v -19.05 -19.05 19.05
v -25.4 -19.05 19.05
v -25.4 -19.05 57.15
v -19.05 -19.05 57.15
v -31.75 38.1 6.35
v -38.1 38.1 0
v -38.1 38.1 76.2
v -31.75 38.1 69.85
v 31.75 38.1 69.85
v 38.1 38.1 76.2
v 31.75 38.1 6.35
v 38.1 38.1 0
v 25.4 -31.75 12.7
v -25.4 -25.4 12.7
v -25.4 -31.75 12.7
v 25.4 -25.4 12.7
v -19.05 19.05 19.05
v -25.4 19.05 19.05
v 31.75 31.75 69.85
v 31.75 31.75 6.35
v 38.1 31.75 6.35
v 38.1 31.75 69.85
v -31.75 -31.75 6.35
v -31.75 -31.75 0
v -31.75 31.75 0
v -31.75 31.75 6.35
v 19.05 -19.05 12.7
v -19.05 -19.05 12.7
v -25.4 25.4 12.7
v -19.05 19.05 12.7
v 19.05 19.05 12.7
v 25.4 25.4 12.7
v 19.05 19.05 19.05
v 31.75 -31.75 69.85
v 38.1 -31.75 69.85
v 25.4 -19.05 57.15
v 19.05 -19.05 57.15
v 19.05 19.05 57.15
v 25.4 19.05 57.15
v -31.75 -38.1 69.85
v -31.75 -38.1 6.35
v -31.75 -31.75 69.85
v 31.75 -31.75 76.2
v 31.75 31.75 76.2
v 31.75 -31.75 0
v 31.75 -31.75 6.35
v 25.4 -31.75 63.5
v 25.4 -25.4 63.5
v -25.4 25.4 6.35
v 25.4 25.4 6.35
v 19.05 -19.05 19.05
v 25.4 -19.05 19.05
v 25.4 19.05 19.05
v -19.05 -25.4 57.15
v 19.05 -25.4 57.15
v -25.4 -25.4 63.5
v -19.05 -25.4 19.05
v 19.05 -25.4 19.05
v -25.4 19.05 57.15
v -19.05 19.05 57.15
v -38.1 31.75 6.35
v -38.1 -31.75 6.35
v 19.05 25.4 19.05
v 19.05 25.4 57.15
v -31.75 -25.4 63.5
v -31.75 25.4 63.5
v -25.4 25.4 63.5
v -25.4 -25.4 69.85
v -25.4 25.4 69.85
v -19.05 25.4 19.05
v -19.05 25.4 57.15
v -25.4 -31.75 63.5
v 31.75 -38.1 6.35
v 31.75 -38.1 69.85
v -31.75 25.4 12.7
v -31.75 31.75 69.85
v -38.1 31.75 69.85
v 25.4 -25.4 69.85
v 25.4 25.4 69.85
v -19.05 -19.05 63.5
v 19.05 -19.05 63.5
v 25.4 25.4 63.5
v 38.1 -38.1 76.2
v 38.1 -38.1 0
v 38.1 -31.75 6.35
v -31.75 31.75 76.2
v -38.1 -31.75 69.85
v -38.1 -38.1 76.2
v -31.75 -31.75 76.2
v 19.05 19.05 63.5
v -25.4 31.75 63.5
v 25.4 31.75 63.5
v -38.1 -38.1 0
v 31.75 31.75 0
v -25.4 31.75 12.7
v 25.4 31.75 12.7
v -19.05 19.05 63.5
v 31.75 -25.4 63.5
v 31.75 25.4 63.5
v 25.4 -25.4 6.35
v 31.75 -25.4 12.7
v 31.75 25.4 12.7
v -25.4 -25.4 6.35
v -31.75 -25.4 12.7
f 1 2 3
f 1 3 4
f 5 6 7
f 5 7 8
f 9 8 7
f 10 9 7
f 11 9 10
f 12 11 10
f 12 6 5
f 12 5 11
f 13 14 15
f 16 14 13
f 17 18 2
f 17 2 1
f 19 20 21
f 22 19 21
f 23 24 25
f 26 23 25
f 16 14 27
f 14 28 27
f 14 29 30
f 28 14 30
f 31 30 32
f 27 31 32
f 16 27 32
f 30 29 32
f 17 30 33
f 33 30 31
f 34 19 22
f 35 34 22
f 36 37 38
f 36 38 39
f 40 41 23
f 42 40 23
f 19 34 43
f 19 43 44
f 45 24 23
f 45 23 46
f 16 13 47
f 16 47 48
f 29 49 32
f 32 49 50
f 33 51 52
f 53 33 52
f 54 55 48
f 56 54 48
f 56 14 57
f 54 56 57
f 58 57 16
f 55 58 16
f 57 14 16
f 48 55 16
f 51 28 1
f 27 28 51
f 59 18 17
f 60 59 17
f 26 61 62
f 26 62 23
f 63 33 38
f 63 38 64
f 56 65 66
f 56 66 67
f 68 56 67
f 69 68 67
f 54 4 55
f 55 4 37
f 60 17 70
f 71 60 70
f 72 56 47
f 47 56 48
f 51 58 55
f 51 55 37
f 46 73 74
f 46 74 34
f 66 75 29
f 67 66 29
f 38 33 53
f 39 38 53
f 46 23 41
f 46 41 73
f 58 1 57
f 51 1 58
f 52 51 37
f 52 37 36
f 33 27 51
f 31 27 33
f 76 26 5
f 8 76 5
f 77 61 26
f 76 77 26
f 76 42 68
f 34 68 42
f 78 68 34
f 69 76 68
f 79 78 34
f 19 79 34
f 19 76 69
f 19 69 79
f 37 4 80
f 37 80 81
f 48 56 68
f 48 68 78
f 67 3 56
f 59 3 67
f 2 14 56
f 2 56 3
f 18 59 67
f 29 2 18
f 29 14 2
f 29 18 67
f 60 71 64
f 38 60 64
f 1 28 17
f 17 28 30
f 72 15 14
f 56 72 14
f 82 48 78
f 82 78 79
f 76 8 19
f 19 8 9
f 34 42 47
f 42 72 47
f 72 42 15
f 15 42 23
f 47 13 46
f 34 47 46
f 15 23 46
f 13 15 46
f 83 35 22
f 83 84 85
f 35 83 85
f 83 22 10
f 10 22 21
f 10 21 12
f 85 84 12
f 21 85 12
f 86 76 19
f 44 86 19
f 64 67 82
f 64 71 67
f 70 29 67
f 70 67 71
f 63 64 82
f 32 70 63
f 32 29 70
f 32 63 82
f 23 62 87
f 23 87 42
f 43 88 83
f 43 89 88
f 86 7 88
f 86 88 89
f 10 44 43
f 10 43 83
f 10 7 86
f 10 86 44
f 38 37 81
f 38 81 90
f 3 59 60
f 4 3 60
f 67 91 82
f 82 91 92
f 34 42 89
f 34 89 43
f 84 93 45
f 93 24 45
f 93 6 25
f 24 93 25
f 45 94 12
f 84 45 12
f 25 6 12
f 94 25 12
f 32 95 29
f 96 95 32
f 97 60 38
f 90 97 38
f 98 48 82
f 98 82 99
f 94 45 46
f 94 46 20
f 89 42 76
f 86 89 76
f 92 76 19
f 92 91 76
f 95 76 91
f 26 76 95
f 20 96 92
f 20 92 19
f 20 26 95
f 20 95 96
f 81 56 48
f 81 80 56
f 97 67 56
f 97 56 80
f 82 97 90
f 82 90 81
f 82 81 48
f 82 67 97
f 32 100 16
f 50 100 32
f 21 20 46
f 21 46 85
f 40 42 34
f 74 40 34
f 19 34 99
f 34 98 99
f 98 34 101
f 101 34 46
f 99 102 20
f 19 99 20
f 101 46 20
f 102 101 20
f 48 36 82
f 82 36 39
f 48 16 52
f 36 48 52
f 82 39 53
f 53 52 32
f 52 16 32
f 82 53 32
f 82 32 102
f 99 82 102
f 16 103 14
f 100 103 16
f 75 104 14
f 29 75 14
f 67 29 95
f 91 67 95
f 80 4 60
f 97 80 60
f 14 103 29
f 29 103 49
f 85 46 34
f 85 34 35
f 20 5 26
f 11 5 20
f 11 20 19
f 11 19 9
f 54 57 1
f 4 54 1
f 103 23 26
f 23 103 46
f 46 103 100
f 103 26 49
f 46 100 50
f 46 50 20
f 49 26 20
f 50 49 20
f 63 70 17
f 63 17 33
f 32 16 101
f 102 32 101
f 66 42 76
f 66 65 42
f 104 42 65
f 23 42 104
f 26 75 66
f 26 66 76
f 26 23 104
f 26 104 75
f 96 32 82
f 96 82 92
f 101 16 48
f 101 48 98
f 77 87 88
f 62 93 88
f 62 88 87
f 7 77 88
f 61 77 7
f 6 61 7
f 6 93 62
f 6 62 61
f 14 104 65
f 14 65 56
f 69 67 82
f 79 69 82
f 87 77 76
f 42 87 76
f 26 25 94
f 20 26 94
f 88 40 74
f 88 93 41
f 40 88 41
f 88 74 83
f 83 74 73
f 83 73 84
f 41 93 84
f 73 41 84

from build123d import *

# Parameters (mm, degrees)
F0_W      = 76.2
F0_H      = 76.2
F0_W_2    = 63.5
F0_H_2    = 63.5
F1_DEPTH  = 6.35
F2_W      = 6.35
F2_H      = 6.35
F3_DEPTH  = 63.5
F4_W      = 76.2
F4_H      = 76.2
F4_W_2    = 63.5
F4_H_2    = 63.5
F5_DEPTH  = 6.35
F6_W      = 63.5
F6_H      = 63.5
F6_W_2    = 50.8
F6_H_2    = 50.8
F7_DEPTH  = 6.35
F8_W      = 6.35
F8_H      = 6.35
F9_DEPTH  = 50.8
F10_W     = 63.5
F10_H     = 63.5
F10_W_2   = 50.8
F10_H_2   = 50.8
F11_DEPTH = 6.35
F12_W     = 50.8
F12_H     = 50.8
F12_W_2   = 38.1
F12_H_2   = 38.1
F13_DEPTH = 6.35
F14_W     = 6.35
F14_H     = 6.35
F15_DEPTH = 38.1
F16_W     = 50.8
F16_H     = 50.8
F16_W_2   = 38.1
F16_H_2   = 38.1
F17_DEPTH = 6.35


with BuildPart() as f1:
    # F0 (on Top) → F1 (new body)
    with BuildSketch(Plane.XY):
        Rectangle(F0_W, F0_H)
        Rectangle(F0_W_2, F0_H_2, mode=Mode.SUBTRACT)
    extrude(amount=F1_DEPTH)

    # F2 (on face) → F3 (join)
    with BuildSketch(Plane.XY.offset(6.35)):
        with Locations((34.925, 34.925)):
            Rectangle(F2_W, F2_H)
        with Locations((-34.925, 34.925)):
            Rectangle(F2_W, F2_H)
        with Locations((34.925, -34.925)):
            Rectangle(F2_W, F2_H)
        with Locations((-34.925, -34.925)):
            Rectangle(F2_W, F2_H)
    extrude(amount=F3_DEPTH)

    # F4 (on face) → F5 (join)
    with BuildSketch(Plane.XY.offset(69.85)):
        Rectangle(F4_W, F4_H)
        Rectangle(F4_W_2, F4_H_2, mode=Mode.SUBTRACT)
    extrude(amount=F5_DEPTH)



with BuildPart() as f7:
    # F6 (on face) → F7 (new body)
    with BuildSketch(Plane.XY.offset(6.35)):
        Rectangle(F6_W, F6_H)
        Rectangle(F6_W_2, F6_H_2, mode=Mode.SUBTRACT)
    extrude(amount=F7_DEPTH)


with BuildPart() as f1_1:
    add(f1.part)

    add(f7.part)  # F9 merges F7
    # F8 (on face) → F9 (join)
    with BuildSketch(Plane.XY.offset(12.7)):
        with Locations((-28.575, 28.575)):
            Rectangle(F8_W, F8_H)
        with Locations((28.575, 28.575)):
            Rectangle(F8_W, F8_H)
        with Locations((28.575, -28.575)):
            Rectangle(F8_W, F8_H)
        with Locations((-28.575, -28.575)):
            Rectangle(F8_W, F8_H)
    extrude(amount=F9_DEPTH)

    # F10 (on face) → F11 (join)
    with BuildSketch(Plane.XY.offset(63.5)):
        Rectangle(F10_W, F10_H)
        Rectangle(F10_W_2, F10_H_2, mode=Mode.SUBTRACT)
    extrude(amount=F11_DEPTH)



with BuildPart() as f13:
    # F12 (on face) → F13 (new body)
    with BuildSketch(Plane.XY.offset(12.7)):
        Rectangle(F12_W, F12_H)
        Rectangle(F12_W_2, F12_H_2, mode=Mode.SUBTRACT)
    extrude(amount=F13_DEPTH)


with BuildPart() as f1_2:
    add(f1_1.part)

    add(f13.part)  # F15 merges F13
    # F14 (on face) → F15 (join)
    with BuildSketch(Plane.XY.offset(19.05)):
        with Locations((-22.225, 22.225)):
            Rectangle(F14_W, F14_H)
        with Locations((22.225, 22.225)):
            Rectangle(F14_W, F14_H)
        with Locations((22.225, -22.225)):
            Rectangle(F14_W, F14_H)
        with Locations((-22.225, -22.225)):
            Rectangle(F14_W, F14_H)
    extrude(amount=F15_DEPTH)

    # F16 (on face) → F17 (join)
    with BuildSketch(Plane.XY.offset(57.15)):
        Rectangle(F16_W, F16_H)
        Rectangle(F16_W_2, F16_H_2, mode=Mode.SUBTRACT)
    extrude(amount=F17_DEPTH)


solid = f1_2.part
